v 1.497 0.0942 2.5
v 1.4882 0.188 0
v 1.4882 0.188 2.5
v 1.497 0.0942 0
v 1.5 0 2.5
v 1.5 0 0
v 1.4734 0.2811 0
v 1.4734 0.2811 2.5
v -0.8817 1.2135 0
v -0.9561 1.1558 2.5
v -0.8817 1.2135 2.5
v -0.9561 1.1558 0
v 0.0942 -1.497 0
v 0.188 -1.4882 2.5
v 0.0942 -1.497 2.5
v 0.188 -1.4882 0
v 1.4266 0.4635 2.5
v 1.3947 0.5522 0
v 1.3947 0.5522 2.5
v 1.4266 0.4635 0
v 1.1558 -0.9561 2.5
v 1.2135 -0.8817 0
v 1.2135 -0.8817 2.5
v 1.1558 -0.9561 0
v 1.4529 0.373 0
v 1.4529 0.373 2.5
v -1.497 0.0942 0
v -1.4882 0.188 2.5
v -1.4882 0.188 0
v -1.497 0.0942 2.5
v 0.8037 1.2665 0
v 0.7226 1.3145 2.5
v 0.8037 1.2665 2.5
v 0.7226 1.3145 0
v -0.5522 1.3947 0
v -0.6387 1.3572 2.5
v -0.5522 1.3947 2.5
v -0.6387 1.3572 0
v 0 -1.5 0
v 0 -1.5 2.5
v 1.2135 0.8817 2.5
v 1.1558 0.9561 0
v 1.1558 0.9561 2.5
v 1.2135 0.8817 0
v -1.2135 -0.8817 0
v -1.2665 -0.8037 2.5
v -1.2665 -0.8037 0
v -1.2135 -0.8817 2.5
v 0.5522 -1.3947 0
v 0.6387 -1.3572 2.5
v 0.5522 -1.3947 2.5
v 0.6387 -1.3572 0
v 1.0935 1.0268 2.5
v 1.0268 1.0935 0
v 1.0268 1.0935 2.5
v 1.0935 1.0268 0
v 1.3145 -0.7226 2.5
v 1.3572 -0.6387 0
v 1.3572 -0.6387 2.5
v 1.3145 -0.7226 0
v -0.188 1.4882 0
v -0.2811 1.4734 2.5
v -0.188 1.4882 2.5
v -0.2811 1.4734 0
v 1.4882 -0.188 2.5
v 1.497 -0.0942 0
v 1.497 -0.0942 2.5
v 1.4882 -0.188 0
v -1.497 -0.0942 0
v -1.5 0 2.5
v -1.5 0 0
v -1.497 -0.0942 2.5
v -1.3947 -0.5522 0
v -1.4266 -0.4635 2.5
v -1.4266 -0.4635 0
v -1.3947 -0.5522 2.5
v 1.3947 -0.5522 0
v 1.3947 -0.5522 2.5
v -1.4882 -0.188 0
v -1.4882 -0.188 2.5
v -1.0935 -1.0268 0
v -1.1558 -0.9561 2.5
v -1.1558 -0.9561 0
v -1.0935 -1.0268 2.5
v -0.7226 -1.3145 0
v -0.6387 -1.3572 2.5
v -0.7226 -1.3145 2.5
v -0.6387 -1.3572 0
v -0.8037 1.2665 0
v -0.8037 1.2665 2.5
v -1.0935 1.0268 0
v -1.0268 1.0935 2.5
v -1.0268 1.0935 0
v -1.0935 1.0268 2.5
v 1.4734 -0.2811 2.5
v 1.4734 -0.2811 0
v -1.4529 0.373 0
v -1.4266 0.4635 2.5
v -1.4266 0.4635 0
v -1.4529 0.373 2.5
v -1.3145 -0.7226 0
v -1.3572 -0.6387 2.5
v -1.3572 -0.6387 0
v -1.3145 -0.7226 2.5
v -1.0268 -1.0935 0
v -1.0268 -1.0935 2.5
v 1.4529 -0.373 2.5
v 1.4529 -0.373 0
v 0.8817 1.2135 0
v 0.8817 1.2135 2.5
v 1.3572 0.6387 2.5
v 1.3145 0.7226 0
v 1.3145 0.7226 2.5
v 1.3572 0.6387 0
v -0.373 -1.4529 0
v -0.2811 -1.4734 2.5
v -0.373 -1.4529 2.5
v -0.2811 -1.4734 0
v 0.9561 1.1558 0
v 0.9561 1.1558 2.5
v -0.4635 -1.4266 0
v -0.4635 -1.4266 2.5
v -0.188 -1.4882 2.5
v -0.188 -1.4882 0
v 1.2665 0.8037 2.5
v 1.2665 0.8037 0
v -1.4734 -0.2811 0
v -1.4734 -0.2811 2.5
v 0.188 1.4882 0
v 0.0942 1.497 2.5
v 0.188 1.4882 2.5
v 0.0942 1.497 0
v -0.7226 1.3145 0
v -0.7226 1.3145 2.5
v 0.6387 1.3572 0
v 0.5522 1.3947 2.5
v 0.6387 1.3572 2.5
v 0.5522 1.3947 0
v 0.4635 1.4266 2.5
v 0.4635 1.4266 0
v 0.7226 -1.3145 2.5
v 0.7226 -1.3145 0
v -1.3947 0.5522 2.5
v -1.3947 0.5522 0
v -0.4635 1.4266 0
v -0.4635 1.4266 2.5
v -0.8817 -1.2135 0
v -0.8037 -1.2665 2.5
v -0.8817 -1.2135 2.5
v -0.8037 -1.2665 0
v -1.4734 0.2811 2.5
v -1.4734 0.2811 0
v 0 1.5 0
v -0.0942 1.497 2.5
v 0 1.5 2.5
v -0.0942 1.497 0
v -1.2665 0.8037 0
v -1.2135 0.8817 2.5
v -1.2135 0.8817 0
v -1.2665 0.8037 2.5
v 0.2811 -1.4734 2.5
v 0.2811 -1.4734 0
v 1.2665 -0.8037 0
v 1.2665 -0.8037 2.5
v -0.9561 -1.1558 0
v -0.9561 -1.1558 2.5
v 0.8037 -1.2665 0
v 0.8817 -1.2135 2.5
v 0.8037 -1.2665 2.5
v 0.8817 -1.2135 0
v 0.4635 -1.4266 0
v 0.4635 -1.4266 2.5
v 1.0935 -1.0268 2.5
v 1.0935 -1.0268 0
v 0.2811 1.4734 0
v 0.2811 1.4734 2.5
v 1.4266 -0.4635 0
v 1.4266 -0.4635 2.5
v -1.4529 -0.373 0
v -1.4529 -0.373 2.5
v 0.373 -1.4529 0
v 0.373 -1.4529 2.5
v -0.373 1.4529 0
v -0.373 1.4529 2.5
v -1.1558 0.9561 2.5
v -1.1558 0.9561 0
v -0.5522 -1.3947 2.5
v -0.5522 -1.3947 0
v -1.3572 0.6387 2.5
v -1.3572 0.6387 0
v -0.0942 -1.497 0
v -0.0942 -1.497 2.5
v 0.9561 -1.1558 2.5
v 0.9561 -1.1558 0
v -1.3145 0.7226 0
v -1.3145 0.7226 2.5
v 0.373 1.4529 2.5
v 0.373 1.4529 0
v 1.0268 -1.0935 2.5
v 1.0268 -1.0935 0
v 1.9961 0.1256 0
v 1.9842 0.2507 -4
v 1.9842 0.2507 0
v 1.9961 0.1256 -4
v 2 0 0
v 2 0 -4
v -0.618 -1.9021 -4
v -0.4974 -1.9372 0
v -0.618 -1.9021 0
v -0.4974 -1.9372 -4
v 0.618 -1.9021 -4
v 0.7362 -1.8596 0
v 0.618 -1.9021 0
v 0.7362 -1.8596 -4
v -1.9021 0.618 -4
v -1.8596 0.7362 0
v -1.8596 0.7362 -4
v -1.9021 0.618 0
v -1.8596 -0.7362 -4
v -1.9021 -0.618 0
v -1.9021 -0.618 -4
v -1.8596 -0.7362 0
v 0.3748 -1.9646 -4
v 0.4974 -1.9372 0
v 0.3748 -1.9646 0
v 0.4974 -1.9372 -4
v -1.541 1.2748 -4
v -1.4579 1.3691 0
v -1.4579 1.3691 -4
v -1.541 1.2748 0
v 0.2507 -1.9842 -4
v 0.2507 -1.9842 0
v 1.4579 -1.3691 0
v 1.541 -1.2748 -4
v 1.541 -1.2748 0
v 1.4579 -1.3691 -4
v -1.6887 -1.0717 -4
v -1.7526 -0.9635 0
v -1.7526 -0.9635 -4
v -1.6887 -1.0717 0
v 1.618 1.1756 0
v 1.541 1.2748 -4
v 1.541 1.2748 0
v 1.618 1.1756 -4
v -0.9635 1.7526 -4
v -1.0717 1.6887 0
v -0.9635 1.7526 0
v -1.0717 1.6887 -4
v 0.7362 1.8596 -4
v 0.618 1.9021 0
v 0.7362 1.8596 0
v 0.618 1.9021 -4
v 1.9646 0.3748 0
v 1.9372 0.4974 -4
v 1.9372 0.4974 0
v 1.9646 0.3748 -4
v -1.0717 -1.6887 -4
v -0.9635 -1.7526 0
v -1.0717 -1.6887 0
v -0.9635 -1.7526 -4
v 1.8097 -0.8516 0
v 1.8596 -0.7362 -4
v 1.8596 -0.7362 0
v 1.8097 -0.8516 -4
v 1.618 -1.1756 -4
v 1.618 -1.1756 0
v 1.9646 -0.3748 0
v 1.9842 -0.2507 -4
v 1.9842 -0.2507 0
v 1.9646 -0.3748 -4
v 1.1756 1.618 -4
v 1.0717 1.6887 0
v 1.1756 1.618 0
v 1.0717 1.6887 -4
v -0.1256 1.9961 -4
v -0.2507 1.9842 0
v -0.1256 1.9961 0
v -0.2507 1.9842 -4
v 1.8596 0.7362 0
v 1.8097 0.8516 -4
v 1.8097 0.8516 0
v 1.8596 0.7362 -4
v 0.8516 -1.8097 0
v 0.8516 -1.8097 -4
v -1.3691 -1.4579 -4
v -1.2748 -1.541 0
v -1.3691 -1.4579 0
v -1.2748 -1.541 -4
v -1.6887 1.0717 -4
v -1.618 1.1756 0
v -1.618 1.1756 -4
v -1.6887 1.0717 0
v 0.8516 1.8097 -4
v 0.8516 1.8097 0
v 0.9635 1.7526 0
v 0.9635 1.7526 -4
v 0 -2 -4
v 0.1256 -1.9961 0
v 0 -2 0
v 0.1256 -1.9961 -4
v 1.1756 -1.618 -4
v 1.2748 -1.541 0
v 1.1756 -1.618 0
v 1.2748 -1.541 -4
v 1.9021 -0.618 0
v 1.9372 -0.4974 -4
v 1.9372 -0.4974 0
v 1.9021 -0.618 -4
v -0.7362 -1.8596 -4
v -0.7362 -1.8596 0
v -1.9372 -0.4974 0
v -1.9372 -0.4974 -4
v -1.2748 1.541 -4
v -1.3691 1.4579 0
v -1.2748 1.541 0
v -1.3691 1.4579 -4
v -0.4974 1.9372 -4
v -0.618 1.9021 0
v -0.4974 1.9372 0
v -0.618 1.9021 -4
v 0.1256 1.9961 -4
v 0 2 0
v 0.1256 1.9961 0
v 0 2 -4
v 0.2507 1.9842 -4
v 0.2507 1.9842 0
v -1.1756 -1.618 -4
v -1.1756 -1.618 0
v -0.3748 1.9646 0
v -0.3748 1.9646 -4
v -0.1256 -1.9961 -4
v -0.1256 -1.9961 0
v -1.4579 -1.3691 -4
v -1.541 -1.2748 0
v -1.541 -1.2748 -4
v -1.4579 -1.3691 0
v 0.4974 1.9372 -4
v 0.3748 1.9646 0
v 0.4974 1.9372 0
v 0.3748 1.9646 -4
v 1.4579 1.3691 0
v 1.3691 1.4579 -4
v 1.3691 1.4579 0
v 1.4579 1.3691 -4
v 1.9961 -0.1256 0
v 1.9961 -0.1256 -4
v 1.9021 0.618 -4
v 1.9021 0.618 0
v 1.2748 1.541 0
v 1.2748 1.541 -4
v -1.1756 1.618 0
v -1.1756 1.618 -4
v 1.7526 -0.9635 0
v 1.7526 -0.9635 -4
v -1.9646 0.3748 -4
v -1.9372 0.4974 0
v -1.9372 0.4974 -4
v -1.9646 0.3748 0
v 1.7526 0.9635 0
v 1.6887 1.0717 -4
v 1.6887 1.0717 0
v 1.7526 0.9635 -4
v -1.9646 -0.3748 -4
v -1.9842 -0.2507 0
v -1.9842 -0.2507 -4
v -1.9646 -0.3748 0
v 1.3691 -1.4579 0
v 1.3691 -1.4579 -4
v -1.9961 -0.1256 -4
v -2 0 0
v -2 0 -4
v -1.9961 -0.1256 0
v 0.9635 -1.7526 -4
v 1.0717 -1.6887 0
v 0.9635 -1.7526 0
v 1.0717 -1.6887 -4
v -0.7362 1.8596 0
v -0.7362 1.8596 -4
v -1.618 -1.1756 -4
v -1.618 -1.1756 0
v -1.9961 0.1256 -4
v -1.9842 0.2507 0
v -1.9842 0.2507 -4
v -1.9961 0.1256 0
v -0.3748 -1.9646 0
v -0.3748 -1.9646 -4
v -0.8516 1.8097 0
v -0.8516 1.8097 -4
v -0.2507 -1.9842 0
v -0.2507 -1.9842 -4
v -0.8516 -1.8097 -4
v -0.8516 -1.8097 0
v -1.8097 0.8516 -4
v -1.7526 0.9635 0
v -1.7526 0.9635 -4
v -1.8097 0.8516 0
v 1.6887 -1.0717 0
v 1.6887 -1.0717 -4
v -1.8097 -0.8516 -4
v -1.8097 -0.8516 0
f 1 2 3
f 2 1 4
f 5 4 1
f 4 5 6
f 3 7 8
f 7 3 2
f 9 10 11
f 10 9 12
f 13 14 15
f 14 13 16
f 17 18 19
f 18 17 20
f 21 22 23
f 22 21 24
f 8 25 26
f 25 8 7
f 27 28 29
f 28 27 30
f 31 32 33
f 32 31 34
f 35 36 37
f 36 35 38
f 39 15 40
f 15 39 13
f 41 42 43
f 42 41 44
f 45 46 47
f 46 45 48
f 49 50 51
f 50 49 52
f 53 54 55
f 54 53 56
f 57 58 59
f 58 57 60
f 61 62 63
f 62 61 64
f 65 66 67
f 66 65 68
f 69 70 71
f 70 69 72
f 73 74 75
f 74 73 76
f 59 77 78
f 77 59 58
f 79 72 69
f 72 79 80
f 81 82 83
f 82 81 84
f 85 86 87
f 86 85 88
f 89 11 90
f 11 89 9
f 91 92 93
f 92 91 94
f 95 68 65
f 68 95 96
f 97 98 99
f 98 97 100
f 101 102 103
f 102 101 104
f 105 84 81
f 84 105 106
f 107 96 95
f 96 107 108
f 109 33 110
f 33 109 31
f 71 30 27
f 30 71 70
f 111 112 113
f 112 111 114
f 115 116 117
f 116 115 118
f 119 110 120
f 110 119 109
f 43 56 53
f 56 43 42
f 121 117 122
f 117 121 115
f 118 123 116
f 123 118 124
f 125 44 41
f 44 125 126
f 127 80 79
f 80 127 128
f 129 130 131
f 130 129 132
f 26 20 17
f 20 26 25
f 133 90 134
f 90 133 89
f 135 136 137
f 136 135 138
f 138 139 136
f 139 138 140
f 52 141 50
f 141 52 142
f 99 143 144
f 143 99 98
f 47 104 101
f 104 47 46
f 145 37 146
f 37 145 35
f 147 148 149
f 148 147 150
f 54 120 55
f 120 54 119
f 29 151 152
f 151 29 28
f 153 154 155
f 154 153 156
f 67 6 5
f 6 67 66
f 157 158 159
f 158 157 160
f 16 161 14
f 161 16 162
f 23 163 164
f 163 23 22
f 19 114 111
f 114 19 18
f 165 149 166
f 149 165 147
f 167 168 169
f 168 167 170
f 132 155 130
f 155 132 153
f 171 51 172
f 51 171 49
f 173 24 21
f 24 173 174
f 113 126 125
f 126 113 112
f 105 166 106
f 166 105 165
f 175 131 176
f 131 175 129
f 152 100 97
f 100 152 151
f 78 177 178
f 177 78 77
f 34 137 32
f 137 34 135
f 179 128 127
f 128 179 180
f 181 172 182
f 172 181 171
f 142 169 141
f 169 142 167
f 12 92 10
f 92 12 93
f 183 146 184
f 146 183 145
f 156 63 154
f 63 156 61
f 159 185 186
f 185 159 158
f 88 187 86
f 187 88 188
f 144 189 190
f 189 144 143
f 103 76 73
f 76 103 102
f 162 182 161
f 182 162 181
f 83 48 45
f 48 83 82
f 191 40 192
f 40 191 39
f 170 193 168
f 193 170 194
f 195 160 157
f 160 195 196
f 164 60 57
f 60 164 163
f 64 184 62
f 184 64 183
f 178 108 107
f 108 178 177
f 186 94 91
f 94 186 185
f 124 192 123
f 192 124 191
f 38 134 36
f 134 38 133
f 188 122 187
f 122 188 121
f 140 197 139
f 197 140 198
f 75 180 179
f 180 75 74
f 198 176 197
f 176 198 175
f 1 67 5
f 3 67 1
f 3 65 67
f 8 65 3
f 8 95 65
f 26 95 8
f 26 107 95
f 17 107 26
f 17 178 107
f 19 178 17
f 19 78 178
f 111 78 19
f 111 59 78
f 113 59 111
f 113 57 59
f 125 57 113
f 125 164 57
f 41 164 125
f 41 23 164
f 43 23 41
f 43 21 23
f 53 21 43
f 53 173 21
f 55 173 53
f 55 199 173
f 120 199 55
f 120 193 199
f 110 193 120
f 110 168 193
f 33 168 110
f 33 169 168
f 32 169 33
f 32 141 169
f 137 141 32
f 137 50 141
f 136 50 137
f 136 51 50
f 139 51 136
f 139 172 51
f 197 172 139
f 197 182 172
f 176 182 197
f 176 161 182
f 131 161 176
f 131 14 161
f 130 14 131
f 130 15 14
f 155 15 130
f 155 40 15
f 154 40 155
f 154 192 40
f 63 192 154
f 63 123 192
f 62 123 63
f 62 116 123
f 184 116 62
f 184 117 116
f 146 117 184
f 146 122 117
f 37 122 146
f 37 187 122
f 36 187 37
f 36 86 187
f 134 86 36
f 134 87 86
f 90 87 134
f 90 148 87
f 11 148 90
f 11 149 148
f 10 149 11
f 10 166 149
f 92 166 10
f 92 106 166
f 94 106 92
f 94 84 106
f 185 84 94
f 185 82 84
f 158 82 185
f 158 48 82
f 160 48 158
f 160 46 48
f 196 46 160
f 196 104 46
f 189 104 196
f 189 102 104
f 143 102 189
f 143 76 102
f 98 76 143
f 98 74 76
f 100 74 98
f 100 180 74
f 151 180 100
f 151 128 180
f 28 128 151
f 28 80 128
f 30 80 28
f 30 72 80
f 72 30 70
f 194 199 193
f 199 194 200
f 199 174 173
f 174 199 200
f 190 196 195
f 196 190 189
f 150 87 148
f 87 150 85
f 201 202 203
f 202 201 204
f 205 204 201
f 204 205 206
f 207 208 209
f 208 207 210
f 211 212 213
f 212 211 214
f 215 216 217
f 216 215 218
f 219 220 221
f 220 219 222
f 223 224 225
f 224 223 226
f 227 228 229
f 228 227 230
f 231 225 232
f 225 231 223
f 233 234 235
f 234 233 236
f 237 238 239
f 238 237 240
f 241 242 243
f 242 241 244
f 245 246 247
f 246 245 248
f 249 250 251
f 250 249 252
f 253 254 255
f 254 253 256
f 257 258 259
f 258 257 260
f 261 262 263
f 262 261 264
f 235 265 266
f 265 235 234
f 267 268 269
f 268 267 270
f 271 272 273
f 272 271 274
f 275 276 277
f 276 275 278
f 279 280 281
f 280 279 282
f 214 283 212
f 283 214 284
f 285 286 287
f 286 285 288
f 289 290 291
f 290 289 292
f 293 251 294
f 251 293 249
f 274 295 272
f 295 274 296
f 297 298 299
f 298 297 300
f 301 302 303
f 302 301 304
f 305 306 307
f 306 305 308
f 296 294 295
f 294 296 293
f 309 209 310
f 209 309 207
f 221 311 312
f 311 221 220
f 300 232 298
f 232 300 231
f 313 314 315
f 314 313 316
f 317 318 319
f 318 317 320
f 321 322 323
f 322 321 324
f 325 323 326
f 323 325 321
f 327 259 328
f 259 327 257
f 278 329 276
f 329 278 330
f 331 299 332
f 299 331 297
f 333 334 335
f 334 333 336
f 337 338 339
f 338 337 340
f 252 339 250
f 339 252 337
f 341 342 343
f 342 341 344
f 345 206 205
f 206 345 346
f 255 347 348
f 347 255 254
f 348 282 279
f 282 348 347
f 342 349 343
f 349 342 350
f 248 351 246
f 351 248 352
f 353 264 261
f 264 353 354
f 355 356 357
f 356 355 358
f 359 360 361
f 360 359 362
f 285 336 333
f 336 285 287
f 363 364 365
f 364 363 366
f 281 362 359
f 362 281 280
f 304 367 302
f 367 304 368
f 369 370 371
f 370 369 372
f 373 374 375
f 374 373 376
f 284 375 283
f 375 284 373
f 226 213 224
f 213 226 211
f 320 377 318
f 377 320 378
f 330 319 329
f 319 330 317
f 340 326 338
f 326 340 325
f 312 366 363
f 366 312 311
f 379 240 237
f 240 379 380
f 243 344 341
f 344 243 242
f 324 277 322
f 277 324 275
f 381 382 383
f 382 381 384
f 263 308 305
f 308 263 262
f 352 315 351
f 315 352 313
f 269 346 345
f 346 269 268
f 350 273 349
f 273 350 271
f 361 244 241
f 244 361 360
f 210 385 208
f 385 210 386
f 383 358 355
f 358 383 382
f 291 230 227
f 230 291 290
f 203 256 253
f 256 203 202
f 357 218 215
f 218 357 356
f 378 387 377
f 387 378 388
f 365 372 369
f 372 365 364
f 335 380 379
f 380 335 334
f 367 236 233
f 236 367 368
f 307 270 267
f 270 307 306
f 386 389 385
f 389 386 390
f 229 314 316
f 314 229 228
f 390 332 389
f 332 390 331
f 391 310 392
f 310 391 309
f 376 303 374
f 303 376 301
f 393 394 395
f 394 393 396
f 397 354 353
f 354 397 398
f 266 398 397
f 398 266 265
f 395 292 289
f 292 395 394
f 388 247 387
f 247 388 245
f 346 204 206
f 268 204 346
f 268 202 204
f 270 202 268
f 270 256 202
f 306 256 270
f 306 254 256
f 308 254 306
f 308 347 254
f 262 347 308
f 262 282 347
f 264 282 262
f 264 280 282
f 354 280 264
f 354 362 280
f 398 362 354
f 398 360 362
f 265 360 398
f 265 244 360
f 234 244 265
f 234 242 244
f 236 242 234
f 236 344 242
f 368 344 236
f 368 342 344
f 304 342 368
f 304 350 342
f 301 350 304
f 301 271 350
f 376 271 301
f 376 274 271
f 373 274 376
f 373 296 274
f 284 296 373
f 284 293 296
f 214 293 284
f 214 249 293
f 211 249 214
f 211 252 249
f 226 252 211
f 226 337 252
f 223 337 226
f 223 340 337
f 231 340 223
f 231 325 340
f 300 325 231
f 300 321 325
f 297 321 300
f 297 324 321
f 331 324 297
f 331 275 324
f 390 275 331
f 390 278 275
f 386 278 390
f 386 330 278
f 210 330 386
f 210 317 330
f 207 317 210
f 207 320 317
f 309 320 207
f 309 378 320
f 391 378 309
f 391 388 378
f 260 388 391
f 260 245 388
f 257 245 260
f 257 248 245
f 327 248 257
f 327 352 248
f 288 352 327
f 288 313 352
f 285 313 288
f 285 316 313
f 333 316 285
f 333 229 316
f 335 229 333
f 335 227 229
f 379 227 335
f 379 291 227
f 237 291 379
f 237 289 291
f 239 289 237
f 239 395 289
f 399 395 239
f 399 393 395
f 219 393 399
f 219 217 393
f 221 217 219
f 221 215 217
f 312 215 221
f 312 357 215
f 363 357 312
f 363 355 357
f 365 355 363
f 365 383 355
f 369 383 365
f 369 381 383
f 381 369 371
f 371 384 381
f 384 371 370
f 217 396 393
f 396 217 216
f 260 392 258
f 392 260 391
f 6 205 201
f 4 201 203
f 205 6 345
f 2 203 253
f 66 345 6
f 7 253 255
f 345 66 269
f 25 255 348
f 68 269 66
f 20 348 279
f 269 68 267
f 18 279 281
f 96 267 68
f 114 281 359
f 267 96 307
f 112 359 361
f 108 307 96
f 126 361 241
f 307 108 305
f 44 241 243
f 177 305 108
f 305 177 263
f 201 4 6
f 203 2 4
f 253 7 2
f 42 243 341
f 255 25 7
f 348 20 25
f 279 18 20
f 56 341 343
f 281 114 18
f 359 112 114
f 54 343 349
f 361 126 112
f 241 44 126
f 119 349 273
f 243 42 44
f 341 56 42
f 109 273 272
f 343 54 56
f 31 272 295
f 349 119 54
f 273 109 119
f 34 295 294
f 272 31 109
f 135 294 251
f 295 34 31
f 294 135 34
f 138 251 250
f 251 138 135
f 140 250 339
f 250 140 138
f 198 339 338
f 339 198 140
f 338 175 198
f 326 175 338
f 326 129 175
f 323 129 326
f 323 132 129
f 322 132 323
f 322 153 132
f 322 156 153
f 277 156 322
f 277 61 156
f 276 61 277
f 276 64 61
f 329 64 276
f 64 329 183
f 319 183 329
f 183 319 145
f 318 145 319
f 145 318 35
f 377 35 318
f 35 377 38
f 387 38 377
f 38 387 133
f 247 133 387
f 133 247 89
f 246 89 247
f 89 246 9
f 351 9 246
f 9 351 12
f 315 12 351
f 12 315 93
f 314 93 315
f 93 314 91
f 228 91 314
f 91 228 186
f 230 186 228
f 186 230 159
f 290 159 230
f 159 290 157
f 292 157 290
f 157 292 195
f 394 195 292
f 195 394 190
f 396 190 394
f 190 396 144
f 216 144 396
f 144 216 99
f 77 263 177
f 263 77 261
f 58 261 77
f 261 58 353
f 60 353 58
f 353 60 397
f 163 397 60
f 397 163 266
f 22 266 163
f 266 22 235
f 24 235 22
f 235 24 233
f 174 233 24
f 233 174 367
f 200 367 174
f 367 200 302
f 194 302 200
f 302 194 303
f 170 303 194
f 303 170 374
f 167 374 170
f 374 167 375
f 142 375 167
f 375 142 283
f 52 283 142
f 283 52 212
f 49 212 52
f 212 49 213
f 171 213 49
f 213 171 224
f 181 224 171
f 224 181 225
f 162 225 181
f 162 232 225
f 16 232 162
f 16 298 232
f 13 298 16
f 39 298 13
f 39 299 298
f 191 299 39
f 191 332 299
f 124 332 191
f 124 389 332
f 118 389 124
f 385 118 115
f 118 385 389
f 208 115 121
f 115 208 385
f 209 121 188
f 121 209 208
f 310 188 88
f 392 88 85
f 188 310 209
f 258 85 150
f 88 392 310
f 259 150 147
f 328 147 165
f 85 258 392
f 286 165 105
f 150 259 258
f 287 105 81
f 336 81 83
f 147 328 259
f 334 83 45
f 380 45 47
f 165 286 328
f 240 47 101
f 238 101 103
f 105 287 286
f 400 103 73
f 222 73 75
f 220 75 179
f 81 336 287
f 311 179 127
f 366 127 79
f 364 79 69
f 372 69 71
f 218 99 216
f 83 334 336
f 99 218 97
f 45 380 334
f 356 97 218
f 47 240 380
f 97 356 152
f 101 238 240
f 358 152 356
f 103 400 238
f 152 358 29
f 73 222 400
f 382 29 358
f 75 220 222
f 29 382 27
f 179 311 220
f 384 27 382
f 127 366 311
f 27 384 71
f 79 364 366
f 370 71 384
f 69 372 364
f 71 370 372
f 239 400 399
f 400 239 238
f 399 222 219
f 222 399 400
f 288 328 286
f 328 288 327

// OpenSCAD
$fn=100; 

module led_3mm(){
    cylinder(r=1.5, h=5, center = true);
    translate([0, 0, -2]) cylinder(r=2, h=4, center = true);
}

led_3mm();
